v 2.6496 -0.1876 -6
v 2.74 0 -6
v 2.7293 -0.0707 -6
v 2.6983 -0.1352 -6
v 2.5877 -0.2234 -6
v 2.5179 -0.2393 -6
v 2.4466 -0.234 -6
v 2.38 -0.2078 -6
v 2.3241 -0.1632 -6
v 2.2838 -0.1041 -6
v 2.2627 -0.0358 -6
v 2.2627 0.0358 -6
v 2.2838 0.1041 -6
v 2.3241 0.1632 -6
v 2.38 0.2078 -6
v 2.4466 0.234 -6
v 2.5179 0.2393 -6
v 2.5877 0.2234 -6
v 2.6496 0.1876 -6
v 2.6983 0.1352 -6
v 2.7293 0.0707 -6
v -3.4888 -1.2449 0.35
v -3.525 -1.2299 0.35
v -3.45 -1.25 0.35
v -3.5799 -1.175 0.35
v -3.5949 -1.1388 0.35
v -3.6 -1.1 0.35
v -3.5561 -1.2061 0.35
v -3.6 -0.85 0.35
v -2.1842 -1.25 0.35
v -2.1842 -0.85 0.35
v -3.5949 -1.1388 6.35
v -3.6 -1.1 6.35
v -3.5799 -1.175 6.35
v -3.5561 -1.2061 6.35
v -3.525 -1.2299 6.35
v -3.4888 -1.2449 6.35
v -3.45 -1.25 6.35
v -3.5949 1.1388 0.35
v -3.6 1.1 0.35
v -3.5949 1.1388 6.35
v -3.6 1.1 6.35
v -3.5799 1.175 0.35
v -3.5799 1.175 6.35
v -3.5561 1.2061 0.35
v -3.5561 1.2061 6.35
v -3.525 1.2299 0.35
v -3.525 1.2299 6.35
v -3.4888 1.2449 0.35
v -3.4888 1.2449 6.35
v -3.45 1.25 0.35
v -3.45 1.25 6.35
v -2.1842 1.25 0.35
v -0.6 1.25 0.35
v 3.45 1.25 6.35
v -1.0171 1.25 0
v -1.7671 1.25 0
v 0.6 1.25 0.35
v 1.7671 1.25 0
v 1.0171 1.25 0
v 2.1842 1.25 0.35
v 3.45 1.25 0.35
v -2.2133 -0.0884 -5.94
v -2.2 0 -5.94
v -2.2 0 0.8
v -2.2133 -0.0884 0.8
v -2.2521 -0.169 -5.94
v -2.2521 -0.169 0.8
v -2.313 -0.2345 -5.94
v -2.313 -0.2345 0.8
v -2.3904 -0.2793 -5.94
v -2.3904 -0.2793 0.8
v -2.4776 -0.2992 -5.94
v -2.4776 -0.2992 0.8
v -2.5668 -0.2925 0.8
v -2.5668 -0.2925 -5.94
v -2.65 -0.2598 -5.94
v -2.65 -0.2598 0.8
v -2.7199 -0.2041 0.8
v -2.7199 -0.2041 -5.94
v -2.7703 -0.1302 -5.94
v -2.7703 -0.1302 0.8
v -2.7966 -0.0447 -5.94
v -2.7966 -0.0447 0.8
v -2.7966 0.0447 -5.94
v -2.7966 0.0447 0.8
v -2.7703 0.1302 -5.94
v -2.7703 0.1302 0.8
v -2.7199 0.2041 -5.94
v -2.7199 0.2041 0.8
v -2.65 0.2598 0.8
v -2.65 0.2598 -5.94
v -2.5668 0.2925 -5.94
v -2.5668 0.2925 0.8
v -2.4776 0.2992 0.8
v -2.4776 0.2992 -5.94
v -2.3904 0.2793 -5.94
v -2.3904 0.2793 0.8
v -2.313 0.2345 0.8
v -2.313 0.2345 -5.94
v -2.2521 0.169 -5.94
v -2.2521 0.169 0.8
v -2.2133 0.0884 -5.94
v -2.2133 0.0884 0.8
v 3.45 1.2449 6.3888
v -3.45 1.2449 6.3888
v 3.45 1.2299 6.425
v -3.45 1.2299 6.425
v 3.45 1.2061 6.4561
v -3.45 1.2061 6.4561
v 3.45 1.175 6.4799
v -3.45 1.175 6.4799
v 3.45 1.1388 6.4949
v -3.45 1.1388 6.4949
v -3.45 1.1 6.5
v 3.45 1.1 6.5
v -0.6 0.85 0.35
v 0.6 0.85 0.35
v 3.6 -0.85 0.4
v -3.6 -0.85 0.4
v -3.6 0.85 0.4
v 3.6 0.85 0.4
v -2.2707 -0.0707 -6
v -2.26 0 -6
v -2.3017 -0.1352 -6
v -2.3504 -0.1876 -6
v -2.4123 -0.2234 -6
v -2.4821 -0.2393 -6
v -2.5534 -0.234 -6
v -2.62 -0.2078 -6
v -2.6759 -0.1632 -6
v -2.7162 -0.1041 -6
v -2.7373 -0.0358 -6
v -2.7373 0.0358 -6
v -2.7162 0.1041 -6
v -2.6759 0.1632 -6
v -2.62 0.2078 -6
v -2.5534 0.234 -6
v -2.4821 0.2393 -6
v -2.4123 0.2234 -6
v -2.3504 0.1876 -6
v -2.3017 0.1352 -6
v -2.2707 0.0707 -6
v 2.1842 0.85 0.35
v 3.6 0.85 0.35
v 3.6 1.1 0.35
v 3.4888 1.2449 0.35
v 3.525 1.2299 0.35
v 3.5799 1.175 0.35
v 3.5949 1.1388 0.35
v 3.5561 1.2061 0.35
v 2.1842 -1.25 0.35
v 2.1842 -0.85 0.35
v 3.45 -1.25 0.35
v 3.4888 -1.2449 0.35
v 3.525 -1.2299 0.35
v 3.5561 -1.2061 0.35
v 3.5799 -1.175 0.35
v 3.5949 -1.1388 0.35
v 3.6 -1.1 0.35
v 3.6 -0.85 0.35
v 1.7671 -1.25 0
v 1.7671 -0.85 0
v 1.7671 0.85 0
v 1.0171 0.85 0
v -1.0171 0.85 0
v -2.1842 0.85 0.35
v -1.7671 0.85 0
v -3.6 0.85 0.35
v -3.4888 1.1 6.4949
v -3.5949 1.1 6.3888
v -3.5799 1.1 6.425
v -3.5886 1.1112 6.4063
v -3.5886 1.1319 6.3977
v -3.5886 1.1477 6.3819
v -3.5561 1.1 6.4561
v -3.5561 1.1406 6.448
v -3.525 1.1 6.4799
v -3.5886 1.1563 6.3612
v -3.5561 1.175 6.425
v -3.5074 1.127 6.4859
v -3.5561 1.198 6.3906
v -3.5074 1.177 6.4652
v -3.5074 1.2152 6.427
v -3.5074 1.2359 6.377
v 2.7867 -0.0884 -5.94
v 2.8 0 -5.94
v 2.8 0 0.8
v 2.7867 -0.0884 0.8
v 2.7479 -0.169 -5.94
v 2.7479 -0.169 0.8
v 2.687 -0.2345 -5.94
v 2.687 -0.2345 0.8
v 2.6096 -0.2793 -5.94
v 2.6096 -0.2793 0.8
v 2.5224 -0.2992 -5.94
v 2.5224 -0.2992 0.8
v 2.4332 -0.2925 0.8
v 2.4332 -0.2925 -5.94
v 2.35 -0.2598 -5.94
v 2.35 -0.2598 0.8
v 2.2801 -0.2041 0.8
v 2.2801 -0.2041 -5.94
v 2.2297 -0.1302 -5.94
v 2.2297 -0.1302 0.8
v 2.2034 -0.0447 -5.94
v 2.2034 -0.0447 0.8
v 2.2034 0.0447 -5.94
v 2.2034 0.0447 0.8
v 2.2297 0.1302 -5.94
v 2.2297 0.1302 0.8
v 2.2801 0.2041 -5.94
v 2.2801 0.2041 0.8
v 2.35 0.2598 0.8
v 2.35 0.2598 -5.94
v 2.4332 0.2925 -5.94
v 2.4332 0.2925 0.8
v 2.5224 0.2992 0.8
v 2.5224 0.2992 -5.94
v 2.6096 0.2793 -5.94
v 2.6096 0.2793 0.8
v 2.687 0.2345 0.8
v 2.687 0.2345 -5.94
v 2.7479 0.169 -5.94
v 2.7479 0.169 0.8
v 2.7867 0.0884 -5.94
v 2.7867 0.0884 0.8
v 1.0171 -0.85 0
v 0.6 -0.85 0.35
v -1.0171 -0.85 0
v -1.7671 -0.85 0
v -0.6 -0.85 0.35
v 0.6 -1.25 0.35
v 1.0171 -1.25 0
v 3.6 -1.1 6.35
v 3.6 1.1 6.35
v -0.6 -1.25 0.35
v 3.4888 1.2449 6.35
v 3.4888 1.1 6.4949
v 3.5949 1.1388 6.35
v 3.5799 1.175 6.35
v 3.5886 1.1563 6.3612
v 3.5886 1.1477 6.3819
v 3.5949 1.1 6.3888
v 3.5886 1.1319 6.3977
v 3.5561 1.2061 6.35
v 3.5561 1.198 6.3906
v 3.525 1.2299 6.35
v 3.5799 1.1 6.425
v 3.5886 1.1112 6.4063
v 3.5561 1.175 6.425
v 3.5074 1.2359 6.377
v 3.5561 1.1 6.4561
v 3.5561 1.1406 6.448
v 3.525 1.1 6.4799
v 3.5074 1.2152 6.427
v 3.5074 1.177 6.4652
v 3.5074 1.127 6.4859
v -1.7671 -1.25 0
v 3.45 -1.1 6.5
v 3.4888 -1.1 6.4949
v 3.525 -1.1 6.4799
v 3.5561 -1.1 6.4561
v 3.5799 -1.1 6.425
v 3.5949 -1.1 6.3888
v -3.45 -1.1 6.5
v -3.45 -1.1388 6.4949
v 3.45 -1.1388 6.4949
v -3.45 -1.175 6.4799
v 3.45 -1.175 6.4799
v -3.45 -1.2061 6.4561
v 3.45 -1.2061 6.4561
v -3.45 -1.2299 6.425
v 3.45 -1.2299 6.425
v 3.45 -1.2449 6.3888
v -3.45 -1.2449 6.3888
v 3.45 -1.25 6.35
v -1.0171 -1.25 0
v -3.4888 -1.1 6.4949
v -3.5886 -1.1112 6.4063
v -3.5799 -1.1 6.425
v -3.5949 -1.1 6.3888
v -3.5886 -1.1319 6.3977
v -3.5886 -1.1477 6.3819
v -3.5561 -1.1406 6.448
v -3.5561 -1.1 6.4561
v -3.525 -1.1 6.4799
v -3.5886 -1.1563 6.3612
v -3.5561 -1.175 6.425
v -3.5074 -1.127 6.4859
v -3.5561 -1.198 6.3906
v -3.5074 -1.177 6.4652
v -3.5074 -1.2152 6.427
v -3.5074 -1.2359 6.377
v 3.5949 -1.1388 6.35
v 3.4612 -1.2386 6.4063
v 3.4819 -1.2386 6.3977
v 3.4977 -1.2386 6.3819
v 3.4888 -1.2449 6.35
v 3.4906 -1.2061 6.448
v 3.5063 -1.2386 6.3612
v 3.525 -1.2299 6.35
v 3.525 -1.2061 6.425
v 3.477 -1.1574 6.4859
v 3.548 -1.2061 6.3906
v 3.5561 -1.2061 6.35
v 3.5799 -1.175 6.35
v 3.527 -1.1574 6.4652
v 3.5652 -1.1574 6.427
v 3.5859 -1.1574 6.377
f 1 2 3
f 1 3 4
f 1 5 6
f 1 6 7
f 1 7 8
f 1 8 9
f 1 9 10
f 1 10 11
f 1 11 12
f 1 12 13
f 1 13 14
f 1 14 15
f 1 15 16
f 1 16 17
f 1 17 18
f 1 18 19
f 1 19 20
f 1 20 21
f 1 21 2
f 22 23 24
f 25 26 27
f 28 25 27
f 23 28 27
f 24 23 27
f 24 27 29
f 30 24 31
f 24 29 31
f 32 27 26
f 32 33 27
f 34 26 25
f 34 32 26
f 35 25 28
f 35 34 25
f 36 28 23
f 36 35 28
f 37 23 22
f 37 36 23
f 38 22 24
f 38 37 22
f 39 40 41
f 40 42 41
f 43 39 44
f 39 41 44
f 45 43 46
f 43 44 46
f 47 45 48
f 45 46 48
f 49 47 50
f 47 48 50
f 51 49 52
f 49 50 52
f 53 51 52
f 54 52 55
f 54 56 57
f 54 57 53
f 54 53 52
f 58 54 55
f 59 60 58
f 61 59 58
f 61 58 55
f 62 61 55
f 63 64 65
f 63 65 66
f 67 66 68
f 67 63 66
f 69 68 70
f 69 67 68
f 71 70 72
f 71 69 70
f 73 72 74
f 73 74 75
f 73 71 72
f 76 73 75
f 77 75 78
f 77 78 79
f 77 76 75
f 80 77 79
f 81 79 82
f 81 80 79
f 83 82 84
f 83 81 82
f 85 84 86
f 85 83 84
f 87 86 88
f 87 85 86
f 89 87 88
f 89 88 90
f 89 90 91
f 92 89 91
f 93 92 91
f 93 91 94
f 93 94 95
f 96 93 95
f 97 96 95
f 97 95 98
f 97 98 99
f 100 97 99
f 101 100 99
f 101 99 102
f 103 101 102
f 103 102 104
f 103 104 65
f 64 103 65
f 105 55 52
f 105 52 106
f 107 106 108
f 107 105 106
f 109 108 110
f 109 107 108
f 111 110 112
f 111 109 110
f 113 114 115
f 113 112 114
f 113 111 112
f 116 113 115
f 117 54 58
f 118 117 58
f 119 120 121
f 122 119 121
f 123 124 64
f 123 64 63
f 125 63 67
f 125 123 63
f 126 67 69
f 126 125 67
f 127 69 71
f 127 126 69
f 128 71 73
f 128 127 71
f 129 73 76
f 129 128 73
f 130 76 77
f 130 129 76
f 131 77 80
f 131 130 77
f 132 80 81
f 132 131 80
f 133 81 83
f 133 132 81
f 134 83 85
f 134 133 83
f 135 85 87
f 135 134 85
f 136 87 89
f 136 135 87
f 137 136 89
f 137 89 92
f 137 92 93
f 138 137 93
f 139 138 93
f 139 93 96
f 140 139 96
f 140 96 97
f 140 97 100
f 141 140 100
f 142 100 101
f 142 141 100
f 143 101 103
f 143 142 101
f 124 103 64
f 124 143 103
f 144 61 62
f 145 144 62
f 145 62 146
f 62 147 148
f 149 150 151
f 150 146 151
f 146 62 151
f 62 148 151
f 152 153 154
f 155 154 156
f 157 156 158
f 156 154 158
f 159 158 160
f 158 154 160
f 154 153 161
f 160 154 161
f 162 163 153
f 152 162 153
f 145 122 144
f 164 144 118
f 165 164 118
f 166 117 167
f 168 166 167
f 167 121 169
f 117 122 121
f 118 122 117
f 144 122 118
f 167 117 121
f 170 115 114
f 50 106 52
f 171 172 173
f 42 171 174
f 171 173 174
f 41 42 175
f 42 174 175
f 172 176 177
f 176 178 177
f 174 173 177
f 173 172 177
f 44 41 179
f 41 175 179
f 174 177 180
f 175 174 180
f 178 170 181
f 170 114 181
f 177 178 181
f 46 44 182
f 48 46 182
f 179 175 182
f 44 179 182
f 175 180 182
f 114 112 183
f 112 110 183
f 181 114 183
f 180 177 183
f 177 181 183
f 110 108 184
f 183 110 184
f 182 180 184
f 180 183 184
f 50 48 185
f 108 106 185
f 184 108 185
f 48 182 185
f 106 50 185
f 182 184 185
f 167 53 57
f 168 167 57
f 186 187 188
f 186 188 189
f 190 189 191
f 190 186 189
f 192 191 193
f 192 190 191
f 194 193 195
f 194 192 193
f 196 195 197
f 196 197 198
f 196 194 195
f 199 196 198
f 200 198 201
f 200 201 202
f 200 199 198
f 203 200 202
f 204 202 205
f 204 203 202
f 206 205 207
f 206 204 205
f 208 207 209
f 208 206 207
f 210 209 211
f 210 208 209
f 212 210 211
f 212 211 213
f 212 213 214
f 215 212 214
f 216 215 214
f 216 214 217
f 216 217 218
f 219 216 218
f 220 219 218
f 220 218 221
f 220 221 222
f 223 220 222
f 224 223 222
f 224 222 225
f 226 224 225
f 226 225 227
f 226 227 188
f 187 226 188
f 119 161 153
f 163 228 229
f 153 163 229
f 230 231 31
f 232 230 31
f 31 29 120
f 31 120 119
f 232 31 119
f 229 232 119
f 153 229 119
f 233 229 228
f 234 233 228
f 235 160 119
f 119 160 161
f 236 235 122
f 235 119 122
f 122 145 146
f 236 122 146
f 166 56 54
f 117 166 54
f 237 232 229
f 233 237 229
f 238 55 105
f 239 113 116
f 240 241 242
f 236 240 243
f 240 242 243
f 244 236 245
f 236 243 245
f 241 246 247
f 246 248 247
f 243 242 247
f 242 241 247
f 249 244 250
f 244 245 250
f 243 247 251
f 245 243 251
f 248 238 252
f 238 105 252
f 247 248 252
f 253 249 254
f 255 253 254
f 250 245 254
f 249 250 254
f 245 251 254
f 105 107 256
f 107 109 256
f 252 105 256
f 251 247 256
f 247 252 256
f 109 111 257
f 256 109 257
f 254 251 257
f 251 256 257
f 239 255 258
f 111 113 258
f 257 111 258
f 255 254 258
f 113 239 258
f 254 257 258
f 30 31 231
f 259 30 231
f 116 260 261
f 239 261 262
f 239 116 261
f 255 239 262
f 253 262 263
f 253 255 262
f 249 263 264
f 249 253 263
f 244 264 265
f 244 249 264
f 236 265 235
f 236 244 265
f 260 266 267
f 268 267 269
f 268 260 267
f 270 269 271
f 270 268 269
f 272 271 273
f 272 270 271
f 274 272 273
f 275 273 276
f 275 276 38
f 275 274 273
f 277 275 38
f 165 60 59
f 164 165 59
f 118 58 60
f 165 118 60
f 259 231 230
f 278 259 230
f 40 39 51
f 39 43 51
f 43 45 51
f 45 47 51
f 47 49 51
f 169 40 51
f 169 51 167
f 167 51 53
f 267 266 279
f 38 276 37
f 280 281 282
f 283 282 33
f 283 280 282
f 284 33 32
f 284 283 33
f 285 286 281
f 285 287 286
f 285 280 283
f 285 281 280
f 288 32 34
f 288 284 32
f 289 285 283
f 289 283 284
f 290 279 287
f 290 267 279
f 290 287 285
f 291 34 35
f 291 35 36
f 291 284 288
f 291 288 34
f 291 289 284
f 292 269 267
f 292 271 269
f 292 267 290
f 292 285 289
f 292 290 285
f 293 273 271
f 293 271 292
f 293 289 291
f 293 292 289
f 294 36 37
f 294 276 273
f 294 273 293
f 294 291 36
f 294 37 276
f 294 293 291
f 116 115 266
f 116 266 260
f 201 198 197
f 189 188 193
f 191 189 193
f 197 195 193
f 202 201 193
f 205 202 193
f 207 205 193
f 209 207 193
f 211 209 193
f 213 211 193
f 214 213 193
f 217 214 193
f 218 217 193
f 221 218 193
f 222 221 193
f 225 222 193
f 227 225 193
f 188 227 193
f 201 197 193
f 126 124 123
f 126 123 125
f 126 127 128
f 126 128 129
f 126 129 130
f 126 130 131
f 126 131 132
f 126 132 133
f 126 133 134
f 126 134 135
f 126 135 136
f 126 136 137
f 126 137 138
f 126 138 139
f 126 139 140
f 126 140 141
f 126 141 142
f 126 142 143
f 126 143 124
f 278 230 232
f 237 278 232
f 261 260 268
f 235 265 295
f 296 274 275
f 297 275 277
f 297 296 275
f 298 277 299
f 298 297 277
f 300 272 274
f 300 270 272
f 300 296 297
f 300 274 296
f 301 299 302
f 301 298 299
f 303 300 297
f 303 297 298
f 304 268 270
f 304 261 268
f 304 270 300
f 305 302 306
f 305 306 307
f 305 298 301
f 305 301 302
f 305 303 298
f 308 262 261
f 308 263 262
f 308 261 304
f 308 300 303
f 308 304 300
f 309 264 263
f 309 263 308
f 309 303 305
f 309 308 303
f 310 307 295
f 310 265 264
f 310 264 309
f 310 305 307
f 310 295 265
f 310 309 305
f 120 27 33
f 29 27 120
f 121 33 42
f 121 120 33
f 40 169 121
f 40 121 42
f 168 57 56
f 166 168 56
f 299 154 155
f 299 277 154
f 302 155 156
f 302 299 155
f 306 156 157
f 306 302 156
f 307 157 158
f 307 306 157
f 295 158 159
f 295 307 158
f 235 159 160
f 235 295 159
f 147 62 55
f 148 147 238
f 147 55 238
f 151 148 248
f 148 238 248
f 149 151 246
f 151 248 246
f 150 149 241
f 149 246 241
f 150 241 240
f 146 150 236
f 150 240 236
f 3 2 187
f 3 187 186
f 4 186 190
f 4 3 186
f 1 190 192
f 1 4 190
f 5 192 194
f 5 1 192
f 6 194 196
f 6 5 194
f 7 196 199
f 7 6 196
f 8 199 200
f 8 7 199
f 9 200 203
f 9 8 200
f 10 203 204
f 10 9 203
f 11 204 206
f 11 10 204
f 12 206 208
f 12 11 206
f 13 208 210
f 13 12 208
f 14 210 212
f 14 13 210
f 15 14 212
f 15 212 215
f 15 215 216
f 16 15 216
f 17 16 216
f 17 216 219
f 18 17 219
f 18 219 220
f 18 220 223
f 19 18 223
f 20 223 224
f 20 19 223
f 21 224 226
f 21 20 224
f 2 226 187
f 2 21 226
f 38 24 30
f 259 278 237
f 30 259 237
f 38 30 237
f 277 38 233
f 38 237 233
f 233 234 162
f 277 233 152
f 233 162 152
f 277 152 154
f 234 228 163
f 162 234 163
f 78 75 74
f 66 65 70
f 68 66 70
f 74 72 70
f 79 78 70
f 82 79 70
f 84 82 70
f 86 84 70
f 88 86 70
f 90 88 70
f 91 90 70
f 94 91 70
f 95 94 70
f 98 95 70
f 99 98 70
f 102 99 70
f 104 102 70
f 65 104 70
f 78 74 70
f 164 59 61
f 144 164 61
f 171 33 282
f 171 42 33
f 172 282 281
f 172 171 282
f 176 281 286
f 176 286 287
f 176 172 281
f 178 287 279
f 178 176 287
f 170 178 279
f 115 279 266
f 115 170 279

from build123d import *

# Parameters (mm, degrees)
F0_W       = 7.2
F0_H       = 2.5
F1_DEPTH   = 6.5
F2_R       = 0.3
F3_DEPTH   = 6
F5_DEPTH   = 7.3
F7_DEPTH   = 6.5
F8_DEPTH   = 0.8
F9_DEPTH   = 0.8
F10_R      = 0.15
F11_SIZE   = 0.06
F11_2_SIZE = 0.06


with BuildPart() as f1:
    # F0 (on Top) → F1 (new body)
    with BuildSketch(Plane.XY):
        Rectangle(F0_W, F0_H)
    extrude(amount=F1_DEPTH)

    # F4 (on face) → F5 (cut)
    with BuildSketch(Plane(origin=(-3.6, 0, 0), x_dir=(0, -1, 0), z_dir=(-1, 0, 0))):
        Polygon((-0.85, 0.4), (-0.85, 0), (0.85, 0), (0.85, 0.4), (0, 0.4), align=None)
    extrude(amount=-F5_DEPTH, mode=Mode.SUBTRACT)

    # F6 (on face) → F7 (cut)
    with BuildSketch(Plane(origin=(0, 1.25, 0), x_dir=(-1, 0, 0), z_dir=(0, 1, 0))):
        Polygon((-2.1842275148, 0.35), (-3.6, 0.35), (-3.6, 0), (-1.7671137574, 0), align=None)
        Polygon((-0.6, 0.35), (-1.0171137574, 0), (1.0171137574, 0), (0.6, 0.35), (0, 0.35), align=None)
        Polygon((3.6, 0), (3.6, 0.35), (2.1842275148, 0.35), (1.7671137574, 0), (1.8580688629, 0), align=None)
    extrude(amount=-F7_DEPTH, mode=Mode.SUBTRACT)

    # F10
    f10_edges = [f1.edges().sort_by_distance(p)[0] for p in [
        (0, 1.25, 6.5),
        (3.6, 1.25, 3.425),
        (3.6, 0, 6.5),
        (0, -1.25, 6.5),
        (-3.6, 0, 6.5),
        (-3.6, 1.25, 3.425),
        (3.6, -1.25, 3.425),
        (-3.6, -1.25, 3.425),
    ]]
    fillet(f10_edges, radius=F10_R)


with BuildPart() as f3:
    # F2 (on face) → F3 (new body)
    with BuildSketch(Plane(origin=(0, 0, 0), x_dir=(1, 0, 0), z_dir=(0, 0, -1))):
        with Locations((-2.5, 0)):
            Circle(F2_R)
    extrude(amount=F3_DEPTH)

    # F8 (add): a face of the model
    f8_faces = [f3.faces().sort_by_distance(p)[0] for p in [
        (-2.5, 0, 0),
    ]]
    extrude(f8_faces, amount=F8_DEPTH)

    # F11#2
    f11_2_edges = [f3.edges().sort_by_distance(p)[0] for p in [
        (-2.8, 0, -6),
    ]]
    chamfer(f11_2_edges, length=F11_2_SIZE)


with BuildPart() as f3b:
    # F2 (on face) → F3, piece 2 (new body)
    with BuildSketch(Plane(origin=(0, 0, 0), x_dir=(1, 0, 0), z_dir=(0, 0, -1))):
        with Locations((2.5, 0)):
            Circle(F2_R)
    extrude(amount=F3_DEPTH)

    # F9 (add): a face of the model
    f9_faces = [f3b.faces().sort_by_distance(p)[0] for p in [
        (2.5, 0, 0),
    ]]
    extrude(f9_faces, amount=F9_DEPTH)

    # F11
    f11_edges = [f3b.edges().sort_by_distance(p)[0] for p in [
        (2.2, 0, -6),
    ]]
    chamfer(f11_edges, length=F11_SIZE)


solid = Compound([f1.part, f3.part, f3b.part])
